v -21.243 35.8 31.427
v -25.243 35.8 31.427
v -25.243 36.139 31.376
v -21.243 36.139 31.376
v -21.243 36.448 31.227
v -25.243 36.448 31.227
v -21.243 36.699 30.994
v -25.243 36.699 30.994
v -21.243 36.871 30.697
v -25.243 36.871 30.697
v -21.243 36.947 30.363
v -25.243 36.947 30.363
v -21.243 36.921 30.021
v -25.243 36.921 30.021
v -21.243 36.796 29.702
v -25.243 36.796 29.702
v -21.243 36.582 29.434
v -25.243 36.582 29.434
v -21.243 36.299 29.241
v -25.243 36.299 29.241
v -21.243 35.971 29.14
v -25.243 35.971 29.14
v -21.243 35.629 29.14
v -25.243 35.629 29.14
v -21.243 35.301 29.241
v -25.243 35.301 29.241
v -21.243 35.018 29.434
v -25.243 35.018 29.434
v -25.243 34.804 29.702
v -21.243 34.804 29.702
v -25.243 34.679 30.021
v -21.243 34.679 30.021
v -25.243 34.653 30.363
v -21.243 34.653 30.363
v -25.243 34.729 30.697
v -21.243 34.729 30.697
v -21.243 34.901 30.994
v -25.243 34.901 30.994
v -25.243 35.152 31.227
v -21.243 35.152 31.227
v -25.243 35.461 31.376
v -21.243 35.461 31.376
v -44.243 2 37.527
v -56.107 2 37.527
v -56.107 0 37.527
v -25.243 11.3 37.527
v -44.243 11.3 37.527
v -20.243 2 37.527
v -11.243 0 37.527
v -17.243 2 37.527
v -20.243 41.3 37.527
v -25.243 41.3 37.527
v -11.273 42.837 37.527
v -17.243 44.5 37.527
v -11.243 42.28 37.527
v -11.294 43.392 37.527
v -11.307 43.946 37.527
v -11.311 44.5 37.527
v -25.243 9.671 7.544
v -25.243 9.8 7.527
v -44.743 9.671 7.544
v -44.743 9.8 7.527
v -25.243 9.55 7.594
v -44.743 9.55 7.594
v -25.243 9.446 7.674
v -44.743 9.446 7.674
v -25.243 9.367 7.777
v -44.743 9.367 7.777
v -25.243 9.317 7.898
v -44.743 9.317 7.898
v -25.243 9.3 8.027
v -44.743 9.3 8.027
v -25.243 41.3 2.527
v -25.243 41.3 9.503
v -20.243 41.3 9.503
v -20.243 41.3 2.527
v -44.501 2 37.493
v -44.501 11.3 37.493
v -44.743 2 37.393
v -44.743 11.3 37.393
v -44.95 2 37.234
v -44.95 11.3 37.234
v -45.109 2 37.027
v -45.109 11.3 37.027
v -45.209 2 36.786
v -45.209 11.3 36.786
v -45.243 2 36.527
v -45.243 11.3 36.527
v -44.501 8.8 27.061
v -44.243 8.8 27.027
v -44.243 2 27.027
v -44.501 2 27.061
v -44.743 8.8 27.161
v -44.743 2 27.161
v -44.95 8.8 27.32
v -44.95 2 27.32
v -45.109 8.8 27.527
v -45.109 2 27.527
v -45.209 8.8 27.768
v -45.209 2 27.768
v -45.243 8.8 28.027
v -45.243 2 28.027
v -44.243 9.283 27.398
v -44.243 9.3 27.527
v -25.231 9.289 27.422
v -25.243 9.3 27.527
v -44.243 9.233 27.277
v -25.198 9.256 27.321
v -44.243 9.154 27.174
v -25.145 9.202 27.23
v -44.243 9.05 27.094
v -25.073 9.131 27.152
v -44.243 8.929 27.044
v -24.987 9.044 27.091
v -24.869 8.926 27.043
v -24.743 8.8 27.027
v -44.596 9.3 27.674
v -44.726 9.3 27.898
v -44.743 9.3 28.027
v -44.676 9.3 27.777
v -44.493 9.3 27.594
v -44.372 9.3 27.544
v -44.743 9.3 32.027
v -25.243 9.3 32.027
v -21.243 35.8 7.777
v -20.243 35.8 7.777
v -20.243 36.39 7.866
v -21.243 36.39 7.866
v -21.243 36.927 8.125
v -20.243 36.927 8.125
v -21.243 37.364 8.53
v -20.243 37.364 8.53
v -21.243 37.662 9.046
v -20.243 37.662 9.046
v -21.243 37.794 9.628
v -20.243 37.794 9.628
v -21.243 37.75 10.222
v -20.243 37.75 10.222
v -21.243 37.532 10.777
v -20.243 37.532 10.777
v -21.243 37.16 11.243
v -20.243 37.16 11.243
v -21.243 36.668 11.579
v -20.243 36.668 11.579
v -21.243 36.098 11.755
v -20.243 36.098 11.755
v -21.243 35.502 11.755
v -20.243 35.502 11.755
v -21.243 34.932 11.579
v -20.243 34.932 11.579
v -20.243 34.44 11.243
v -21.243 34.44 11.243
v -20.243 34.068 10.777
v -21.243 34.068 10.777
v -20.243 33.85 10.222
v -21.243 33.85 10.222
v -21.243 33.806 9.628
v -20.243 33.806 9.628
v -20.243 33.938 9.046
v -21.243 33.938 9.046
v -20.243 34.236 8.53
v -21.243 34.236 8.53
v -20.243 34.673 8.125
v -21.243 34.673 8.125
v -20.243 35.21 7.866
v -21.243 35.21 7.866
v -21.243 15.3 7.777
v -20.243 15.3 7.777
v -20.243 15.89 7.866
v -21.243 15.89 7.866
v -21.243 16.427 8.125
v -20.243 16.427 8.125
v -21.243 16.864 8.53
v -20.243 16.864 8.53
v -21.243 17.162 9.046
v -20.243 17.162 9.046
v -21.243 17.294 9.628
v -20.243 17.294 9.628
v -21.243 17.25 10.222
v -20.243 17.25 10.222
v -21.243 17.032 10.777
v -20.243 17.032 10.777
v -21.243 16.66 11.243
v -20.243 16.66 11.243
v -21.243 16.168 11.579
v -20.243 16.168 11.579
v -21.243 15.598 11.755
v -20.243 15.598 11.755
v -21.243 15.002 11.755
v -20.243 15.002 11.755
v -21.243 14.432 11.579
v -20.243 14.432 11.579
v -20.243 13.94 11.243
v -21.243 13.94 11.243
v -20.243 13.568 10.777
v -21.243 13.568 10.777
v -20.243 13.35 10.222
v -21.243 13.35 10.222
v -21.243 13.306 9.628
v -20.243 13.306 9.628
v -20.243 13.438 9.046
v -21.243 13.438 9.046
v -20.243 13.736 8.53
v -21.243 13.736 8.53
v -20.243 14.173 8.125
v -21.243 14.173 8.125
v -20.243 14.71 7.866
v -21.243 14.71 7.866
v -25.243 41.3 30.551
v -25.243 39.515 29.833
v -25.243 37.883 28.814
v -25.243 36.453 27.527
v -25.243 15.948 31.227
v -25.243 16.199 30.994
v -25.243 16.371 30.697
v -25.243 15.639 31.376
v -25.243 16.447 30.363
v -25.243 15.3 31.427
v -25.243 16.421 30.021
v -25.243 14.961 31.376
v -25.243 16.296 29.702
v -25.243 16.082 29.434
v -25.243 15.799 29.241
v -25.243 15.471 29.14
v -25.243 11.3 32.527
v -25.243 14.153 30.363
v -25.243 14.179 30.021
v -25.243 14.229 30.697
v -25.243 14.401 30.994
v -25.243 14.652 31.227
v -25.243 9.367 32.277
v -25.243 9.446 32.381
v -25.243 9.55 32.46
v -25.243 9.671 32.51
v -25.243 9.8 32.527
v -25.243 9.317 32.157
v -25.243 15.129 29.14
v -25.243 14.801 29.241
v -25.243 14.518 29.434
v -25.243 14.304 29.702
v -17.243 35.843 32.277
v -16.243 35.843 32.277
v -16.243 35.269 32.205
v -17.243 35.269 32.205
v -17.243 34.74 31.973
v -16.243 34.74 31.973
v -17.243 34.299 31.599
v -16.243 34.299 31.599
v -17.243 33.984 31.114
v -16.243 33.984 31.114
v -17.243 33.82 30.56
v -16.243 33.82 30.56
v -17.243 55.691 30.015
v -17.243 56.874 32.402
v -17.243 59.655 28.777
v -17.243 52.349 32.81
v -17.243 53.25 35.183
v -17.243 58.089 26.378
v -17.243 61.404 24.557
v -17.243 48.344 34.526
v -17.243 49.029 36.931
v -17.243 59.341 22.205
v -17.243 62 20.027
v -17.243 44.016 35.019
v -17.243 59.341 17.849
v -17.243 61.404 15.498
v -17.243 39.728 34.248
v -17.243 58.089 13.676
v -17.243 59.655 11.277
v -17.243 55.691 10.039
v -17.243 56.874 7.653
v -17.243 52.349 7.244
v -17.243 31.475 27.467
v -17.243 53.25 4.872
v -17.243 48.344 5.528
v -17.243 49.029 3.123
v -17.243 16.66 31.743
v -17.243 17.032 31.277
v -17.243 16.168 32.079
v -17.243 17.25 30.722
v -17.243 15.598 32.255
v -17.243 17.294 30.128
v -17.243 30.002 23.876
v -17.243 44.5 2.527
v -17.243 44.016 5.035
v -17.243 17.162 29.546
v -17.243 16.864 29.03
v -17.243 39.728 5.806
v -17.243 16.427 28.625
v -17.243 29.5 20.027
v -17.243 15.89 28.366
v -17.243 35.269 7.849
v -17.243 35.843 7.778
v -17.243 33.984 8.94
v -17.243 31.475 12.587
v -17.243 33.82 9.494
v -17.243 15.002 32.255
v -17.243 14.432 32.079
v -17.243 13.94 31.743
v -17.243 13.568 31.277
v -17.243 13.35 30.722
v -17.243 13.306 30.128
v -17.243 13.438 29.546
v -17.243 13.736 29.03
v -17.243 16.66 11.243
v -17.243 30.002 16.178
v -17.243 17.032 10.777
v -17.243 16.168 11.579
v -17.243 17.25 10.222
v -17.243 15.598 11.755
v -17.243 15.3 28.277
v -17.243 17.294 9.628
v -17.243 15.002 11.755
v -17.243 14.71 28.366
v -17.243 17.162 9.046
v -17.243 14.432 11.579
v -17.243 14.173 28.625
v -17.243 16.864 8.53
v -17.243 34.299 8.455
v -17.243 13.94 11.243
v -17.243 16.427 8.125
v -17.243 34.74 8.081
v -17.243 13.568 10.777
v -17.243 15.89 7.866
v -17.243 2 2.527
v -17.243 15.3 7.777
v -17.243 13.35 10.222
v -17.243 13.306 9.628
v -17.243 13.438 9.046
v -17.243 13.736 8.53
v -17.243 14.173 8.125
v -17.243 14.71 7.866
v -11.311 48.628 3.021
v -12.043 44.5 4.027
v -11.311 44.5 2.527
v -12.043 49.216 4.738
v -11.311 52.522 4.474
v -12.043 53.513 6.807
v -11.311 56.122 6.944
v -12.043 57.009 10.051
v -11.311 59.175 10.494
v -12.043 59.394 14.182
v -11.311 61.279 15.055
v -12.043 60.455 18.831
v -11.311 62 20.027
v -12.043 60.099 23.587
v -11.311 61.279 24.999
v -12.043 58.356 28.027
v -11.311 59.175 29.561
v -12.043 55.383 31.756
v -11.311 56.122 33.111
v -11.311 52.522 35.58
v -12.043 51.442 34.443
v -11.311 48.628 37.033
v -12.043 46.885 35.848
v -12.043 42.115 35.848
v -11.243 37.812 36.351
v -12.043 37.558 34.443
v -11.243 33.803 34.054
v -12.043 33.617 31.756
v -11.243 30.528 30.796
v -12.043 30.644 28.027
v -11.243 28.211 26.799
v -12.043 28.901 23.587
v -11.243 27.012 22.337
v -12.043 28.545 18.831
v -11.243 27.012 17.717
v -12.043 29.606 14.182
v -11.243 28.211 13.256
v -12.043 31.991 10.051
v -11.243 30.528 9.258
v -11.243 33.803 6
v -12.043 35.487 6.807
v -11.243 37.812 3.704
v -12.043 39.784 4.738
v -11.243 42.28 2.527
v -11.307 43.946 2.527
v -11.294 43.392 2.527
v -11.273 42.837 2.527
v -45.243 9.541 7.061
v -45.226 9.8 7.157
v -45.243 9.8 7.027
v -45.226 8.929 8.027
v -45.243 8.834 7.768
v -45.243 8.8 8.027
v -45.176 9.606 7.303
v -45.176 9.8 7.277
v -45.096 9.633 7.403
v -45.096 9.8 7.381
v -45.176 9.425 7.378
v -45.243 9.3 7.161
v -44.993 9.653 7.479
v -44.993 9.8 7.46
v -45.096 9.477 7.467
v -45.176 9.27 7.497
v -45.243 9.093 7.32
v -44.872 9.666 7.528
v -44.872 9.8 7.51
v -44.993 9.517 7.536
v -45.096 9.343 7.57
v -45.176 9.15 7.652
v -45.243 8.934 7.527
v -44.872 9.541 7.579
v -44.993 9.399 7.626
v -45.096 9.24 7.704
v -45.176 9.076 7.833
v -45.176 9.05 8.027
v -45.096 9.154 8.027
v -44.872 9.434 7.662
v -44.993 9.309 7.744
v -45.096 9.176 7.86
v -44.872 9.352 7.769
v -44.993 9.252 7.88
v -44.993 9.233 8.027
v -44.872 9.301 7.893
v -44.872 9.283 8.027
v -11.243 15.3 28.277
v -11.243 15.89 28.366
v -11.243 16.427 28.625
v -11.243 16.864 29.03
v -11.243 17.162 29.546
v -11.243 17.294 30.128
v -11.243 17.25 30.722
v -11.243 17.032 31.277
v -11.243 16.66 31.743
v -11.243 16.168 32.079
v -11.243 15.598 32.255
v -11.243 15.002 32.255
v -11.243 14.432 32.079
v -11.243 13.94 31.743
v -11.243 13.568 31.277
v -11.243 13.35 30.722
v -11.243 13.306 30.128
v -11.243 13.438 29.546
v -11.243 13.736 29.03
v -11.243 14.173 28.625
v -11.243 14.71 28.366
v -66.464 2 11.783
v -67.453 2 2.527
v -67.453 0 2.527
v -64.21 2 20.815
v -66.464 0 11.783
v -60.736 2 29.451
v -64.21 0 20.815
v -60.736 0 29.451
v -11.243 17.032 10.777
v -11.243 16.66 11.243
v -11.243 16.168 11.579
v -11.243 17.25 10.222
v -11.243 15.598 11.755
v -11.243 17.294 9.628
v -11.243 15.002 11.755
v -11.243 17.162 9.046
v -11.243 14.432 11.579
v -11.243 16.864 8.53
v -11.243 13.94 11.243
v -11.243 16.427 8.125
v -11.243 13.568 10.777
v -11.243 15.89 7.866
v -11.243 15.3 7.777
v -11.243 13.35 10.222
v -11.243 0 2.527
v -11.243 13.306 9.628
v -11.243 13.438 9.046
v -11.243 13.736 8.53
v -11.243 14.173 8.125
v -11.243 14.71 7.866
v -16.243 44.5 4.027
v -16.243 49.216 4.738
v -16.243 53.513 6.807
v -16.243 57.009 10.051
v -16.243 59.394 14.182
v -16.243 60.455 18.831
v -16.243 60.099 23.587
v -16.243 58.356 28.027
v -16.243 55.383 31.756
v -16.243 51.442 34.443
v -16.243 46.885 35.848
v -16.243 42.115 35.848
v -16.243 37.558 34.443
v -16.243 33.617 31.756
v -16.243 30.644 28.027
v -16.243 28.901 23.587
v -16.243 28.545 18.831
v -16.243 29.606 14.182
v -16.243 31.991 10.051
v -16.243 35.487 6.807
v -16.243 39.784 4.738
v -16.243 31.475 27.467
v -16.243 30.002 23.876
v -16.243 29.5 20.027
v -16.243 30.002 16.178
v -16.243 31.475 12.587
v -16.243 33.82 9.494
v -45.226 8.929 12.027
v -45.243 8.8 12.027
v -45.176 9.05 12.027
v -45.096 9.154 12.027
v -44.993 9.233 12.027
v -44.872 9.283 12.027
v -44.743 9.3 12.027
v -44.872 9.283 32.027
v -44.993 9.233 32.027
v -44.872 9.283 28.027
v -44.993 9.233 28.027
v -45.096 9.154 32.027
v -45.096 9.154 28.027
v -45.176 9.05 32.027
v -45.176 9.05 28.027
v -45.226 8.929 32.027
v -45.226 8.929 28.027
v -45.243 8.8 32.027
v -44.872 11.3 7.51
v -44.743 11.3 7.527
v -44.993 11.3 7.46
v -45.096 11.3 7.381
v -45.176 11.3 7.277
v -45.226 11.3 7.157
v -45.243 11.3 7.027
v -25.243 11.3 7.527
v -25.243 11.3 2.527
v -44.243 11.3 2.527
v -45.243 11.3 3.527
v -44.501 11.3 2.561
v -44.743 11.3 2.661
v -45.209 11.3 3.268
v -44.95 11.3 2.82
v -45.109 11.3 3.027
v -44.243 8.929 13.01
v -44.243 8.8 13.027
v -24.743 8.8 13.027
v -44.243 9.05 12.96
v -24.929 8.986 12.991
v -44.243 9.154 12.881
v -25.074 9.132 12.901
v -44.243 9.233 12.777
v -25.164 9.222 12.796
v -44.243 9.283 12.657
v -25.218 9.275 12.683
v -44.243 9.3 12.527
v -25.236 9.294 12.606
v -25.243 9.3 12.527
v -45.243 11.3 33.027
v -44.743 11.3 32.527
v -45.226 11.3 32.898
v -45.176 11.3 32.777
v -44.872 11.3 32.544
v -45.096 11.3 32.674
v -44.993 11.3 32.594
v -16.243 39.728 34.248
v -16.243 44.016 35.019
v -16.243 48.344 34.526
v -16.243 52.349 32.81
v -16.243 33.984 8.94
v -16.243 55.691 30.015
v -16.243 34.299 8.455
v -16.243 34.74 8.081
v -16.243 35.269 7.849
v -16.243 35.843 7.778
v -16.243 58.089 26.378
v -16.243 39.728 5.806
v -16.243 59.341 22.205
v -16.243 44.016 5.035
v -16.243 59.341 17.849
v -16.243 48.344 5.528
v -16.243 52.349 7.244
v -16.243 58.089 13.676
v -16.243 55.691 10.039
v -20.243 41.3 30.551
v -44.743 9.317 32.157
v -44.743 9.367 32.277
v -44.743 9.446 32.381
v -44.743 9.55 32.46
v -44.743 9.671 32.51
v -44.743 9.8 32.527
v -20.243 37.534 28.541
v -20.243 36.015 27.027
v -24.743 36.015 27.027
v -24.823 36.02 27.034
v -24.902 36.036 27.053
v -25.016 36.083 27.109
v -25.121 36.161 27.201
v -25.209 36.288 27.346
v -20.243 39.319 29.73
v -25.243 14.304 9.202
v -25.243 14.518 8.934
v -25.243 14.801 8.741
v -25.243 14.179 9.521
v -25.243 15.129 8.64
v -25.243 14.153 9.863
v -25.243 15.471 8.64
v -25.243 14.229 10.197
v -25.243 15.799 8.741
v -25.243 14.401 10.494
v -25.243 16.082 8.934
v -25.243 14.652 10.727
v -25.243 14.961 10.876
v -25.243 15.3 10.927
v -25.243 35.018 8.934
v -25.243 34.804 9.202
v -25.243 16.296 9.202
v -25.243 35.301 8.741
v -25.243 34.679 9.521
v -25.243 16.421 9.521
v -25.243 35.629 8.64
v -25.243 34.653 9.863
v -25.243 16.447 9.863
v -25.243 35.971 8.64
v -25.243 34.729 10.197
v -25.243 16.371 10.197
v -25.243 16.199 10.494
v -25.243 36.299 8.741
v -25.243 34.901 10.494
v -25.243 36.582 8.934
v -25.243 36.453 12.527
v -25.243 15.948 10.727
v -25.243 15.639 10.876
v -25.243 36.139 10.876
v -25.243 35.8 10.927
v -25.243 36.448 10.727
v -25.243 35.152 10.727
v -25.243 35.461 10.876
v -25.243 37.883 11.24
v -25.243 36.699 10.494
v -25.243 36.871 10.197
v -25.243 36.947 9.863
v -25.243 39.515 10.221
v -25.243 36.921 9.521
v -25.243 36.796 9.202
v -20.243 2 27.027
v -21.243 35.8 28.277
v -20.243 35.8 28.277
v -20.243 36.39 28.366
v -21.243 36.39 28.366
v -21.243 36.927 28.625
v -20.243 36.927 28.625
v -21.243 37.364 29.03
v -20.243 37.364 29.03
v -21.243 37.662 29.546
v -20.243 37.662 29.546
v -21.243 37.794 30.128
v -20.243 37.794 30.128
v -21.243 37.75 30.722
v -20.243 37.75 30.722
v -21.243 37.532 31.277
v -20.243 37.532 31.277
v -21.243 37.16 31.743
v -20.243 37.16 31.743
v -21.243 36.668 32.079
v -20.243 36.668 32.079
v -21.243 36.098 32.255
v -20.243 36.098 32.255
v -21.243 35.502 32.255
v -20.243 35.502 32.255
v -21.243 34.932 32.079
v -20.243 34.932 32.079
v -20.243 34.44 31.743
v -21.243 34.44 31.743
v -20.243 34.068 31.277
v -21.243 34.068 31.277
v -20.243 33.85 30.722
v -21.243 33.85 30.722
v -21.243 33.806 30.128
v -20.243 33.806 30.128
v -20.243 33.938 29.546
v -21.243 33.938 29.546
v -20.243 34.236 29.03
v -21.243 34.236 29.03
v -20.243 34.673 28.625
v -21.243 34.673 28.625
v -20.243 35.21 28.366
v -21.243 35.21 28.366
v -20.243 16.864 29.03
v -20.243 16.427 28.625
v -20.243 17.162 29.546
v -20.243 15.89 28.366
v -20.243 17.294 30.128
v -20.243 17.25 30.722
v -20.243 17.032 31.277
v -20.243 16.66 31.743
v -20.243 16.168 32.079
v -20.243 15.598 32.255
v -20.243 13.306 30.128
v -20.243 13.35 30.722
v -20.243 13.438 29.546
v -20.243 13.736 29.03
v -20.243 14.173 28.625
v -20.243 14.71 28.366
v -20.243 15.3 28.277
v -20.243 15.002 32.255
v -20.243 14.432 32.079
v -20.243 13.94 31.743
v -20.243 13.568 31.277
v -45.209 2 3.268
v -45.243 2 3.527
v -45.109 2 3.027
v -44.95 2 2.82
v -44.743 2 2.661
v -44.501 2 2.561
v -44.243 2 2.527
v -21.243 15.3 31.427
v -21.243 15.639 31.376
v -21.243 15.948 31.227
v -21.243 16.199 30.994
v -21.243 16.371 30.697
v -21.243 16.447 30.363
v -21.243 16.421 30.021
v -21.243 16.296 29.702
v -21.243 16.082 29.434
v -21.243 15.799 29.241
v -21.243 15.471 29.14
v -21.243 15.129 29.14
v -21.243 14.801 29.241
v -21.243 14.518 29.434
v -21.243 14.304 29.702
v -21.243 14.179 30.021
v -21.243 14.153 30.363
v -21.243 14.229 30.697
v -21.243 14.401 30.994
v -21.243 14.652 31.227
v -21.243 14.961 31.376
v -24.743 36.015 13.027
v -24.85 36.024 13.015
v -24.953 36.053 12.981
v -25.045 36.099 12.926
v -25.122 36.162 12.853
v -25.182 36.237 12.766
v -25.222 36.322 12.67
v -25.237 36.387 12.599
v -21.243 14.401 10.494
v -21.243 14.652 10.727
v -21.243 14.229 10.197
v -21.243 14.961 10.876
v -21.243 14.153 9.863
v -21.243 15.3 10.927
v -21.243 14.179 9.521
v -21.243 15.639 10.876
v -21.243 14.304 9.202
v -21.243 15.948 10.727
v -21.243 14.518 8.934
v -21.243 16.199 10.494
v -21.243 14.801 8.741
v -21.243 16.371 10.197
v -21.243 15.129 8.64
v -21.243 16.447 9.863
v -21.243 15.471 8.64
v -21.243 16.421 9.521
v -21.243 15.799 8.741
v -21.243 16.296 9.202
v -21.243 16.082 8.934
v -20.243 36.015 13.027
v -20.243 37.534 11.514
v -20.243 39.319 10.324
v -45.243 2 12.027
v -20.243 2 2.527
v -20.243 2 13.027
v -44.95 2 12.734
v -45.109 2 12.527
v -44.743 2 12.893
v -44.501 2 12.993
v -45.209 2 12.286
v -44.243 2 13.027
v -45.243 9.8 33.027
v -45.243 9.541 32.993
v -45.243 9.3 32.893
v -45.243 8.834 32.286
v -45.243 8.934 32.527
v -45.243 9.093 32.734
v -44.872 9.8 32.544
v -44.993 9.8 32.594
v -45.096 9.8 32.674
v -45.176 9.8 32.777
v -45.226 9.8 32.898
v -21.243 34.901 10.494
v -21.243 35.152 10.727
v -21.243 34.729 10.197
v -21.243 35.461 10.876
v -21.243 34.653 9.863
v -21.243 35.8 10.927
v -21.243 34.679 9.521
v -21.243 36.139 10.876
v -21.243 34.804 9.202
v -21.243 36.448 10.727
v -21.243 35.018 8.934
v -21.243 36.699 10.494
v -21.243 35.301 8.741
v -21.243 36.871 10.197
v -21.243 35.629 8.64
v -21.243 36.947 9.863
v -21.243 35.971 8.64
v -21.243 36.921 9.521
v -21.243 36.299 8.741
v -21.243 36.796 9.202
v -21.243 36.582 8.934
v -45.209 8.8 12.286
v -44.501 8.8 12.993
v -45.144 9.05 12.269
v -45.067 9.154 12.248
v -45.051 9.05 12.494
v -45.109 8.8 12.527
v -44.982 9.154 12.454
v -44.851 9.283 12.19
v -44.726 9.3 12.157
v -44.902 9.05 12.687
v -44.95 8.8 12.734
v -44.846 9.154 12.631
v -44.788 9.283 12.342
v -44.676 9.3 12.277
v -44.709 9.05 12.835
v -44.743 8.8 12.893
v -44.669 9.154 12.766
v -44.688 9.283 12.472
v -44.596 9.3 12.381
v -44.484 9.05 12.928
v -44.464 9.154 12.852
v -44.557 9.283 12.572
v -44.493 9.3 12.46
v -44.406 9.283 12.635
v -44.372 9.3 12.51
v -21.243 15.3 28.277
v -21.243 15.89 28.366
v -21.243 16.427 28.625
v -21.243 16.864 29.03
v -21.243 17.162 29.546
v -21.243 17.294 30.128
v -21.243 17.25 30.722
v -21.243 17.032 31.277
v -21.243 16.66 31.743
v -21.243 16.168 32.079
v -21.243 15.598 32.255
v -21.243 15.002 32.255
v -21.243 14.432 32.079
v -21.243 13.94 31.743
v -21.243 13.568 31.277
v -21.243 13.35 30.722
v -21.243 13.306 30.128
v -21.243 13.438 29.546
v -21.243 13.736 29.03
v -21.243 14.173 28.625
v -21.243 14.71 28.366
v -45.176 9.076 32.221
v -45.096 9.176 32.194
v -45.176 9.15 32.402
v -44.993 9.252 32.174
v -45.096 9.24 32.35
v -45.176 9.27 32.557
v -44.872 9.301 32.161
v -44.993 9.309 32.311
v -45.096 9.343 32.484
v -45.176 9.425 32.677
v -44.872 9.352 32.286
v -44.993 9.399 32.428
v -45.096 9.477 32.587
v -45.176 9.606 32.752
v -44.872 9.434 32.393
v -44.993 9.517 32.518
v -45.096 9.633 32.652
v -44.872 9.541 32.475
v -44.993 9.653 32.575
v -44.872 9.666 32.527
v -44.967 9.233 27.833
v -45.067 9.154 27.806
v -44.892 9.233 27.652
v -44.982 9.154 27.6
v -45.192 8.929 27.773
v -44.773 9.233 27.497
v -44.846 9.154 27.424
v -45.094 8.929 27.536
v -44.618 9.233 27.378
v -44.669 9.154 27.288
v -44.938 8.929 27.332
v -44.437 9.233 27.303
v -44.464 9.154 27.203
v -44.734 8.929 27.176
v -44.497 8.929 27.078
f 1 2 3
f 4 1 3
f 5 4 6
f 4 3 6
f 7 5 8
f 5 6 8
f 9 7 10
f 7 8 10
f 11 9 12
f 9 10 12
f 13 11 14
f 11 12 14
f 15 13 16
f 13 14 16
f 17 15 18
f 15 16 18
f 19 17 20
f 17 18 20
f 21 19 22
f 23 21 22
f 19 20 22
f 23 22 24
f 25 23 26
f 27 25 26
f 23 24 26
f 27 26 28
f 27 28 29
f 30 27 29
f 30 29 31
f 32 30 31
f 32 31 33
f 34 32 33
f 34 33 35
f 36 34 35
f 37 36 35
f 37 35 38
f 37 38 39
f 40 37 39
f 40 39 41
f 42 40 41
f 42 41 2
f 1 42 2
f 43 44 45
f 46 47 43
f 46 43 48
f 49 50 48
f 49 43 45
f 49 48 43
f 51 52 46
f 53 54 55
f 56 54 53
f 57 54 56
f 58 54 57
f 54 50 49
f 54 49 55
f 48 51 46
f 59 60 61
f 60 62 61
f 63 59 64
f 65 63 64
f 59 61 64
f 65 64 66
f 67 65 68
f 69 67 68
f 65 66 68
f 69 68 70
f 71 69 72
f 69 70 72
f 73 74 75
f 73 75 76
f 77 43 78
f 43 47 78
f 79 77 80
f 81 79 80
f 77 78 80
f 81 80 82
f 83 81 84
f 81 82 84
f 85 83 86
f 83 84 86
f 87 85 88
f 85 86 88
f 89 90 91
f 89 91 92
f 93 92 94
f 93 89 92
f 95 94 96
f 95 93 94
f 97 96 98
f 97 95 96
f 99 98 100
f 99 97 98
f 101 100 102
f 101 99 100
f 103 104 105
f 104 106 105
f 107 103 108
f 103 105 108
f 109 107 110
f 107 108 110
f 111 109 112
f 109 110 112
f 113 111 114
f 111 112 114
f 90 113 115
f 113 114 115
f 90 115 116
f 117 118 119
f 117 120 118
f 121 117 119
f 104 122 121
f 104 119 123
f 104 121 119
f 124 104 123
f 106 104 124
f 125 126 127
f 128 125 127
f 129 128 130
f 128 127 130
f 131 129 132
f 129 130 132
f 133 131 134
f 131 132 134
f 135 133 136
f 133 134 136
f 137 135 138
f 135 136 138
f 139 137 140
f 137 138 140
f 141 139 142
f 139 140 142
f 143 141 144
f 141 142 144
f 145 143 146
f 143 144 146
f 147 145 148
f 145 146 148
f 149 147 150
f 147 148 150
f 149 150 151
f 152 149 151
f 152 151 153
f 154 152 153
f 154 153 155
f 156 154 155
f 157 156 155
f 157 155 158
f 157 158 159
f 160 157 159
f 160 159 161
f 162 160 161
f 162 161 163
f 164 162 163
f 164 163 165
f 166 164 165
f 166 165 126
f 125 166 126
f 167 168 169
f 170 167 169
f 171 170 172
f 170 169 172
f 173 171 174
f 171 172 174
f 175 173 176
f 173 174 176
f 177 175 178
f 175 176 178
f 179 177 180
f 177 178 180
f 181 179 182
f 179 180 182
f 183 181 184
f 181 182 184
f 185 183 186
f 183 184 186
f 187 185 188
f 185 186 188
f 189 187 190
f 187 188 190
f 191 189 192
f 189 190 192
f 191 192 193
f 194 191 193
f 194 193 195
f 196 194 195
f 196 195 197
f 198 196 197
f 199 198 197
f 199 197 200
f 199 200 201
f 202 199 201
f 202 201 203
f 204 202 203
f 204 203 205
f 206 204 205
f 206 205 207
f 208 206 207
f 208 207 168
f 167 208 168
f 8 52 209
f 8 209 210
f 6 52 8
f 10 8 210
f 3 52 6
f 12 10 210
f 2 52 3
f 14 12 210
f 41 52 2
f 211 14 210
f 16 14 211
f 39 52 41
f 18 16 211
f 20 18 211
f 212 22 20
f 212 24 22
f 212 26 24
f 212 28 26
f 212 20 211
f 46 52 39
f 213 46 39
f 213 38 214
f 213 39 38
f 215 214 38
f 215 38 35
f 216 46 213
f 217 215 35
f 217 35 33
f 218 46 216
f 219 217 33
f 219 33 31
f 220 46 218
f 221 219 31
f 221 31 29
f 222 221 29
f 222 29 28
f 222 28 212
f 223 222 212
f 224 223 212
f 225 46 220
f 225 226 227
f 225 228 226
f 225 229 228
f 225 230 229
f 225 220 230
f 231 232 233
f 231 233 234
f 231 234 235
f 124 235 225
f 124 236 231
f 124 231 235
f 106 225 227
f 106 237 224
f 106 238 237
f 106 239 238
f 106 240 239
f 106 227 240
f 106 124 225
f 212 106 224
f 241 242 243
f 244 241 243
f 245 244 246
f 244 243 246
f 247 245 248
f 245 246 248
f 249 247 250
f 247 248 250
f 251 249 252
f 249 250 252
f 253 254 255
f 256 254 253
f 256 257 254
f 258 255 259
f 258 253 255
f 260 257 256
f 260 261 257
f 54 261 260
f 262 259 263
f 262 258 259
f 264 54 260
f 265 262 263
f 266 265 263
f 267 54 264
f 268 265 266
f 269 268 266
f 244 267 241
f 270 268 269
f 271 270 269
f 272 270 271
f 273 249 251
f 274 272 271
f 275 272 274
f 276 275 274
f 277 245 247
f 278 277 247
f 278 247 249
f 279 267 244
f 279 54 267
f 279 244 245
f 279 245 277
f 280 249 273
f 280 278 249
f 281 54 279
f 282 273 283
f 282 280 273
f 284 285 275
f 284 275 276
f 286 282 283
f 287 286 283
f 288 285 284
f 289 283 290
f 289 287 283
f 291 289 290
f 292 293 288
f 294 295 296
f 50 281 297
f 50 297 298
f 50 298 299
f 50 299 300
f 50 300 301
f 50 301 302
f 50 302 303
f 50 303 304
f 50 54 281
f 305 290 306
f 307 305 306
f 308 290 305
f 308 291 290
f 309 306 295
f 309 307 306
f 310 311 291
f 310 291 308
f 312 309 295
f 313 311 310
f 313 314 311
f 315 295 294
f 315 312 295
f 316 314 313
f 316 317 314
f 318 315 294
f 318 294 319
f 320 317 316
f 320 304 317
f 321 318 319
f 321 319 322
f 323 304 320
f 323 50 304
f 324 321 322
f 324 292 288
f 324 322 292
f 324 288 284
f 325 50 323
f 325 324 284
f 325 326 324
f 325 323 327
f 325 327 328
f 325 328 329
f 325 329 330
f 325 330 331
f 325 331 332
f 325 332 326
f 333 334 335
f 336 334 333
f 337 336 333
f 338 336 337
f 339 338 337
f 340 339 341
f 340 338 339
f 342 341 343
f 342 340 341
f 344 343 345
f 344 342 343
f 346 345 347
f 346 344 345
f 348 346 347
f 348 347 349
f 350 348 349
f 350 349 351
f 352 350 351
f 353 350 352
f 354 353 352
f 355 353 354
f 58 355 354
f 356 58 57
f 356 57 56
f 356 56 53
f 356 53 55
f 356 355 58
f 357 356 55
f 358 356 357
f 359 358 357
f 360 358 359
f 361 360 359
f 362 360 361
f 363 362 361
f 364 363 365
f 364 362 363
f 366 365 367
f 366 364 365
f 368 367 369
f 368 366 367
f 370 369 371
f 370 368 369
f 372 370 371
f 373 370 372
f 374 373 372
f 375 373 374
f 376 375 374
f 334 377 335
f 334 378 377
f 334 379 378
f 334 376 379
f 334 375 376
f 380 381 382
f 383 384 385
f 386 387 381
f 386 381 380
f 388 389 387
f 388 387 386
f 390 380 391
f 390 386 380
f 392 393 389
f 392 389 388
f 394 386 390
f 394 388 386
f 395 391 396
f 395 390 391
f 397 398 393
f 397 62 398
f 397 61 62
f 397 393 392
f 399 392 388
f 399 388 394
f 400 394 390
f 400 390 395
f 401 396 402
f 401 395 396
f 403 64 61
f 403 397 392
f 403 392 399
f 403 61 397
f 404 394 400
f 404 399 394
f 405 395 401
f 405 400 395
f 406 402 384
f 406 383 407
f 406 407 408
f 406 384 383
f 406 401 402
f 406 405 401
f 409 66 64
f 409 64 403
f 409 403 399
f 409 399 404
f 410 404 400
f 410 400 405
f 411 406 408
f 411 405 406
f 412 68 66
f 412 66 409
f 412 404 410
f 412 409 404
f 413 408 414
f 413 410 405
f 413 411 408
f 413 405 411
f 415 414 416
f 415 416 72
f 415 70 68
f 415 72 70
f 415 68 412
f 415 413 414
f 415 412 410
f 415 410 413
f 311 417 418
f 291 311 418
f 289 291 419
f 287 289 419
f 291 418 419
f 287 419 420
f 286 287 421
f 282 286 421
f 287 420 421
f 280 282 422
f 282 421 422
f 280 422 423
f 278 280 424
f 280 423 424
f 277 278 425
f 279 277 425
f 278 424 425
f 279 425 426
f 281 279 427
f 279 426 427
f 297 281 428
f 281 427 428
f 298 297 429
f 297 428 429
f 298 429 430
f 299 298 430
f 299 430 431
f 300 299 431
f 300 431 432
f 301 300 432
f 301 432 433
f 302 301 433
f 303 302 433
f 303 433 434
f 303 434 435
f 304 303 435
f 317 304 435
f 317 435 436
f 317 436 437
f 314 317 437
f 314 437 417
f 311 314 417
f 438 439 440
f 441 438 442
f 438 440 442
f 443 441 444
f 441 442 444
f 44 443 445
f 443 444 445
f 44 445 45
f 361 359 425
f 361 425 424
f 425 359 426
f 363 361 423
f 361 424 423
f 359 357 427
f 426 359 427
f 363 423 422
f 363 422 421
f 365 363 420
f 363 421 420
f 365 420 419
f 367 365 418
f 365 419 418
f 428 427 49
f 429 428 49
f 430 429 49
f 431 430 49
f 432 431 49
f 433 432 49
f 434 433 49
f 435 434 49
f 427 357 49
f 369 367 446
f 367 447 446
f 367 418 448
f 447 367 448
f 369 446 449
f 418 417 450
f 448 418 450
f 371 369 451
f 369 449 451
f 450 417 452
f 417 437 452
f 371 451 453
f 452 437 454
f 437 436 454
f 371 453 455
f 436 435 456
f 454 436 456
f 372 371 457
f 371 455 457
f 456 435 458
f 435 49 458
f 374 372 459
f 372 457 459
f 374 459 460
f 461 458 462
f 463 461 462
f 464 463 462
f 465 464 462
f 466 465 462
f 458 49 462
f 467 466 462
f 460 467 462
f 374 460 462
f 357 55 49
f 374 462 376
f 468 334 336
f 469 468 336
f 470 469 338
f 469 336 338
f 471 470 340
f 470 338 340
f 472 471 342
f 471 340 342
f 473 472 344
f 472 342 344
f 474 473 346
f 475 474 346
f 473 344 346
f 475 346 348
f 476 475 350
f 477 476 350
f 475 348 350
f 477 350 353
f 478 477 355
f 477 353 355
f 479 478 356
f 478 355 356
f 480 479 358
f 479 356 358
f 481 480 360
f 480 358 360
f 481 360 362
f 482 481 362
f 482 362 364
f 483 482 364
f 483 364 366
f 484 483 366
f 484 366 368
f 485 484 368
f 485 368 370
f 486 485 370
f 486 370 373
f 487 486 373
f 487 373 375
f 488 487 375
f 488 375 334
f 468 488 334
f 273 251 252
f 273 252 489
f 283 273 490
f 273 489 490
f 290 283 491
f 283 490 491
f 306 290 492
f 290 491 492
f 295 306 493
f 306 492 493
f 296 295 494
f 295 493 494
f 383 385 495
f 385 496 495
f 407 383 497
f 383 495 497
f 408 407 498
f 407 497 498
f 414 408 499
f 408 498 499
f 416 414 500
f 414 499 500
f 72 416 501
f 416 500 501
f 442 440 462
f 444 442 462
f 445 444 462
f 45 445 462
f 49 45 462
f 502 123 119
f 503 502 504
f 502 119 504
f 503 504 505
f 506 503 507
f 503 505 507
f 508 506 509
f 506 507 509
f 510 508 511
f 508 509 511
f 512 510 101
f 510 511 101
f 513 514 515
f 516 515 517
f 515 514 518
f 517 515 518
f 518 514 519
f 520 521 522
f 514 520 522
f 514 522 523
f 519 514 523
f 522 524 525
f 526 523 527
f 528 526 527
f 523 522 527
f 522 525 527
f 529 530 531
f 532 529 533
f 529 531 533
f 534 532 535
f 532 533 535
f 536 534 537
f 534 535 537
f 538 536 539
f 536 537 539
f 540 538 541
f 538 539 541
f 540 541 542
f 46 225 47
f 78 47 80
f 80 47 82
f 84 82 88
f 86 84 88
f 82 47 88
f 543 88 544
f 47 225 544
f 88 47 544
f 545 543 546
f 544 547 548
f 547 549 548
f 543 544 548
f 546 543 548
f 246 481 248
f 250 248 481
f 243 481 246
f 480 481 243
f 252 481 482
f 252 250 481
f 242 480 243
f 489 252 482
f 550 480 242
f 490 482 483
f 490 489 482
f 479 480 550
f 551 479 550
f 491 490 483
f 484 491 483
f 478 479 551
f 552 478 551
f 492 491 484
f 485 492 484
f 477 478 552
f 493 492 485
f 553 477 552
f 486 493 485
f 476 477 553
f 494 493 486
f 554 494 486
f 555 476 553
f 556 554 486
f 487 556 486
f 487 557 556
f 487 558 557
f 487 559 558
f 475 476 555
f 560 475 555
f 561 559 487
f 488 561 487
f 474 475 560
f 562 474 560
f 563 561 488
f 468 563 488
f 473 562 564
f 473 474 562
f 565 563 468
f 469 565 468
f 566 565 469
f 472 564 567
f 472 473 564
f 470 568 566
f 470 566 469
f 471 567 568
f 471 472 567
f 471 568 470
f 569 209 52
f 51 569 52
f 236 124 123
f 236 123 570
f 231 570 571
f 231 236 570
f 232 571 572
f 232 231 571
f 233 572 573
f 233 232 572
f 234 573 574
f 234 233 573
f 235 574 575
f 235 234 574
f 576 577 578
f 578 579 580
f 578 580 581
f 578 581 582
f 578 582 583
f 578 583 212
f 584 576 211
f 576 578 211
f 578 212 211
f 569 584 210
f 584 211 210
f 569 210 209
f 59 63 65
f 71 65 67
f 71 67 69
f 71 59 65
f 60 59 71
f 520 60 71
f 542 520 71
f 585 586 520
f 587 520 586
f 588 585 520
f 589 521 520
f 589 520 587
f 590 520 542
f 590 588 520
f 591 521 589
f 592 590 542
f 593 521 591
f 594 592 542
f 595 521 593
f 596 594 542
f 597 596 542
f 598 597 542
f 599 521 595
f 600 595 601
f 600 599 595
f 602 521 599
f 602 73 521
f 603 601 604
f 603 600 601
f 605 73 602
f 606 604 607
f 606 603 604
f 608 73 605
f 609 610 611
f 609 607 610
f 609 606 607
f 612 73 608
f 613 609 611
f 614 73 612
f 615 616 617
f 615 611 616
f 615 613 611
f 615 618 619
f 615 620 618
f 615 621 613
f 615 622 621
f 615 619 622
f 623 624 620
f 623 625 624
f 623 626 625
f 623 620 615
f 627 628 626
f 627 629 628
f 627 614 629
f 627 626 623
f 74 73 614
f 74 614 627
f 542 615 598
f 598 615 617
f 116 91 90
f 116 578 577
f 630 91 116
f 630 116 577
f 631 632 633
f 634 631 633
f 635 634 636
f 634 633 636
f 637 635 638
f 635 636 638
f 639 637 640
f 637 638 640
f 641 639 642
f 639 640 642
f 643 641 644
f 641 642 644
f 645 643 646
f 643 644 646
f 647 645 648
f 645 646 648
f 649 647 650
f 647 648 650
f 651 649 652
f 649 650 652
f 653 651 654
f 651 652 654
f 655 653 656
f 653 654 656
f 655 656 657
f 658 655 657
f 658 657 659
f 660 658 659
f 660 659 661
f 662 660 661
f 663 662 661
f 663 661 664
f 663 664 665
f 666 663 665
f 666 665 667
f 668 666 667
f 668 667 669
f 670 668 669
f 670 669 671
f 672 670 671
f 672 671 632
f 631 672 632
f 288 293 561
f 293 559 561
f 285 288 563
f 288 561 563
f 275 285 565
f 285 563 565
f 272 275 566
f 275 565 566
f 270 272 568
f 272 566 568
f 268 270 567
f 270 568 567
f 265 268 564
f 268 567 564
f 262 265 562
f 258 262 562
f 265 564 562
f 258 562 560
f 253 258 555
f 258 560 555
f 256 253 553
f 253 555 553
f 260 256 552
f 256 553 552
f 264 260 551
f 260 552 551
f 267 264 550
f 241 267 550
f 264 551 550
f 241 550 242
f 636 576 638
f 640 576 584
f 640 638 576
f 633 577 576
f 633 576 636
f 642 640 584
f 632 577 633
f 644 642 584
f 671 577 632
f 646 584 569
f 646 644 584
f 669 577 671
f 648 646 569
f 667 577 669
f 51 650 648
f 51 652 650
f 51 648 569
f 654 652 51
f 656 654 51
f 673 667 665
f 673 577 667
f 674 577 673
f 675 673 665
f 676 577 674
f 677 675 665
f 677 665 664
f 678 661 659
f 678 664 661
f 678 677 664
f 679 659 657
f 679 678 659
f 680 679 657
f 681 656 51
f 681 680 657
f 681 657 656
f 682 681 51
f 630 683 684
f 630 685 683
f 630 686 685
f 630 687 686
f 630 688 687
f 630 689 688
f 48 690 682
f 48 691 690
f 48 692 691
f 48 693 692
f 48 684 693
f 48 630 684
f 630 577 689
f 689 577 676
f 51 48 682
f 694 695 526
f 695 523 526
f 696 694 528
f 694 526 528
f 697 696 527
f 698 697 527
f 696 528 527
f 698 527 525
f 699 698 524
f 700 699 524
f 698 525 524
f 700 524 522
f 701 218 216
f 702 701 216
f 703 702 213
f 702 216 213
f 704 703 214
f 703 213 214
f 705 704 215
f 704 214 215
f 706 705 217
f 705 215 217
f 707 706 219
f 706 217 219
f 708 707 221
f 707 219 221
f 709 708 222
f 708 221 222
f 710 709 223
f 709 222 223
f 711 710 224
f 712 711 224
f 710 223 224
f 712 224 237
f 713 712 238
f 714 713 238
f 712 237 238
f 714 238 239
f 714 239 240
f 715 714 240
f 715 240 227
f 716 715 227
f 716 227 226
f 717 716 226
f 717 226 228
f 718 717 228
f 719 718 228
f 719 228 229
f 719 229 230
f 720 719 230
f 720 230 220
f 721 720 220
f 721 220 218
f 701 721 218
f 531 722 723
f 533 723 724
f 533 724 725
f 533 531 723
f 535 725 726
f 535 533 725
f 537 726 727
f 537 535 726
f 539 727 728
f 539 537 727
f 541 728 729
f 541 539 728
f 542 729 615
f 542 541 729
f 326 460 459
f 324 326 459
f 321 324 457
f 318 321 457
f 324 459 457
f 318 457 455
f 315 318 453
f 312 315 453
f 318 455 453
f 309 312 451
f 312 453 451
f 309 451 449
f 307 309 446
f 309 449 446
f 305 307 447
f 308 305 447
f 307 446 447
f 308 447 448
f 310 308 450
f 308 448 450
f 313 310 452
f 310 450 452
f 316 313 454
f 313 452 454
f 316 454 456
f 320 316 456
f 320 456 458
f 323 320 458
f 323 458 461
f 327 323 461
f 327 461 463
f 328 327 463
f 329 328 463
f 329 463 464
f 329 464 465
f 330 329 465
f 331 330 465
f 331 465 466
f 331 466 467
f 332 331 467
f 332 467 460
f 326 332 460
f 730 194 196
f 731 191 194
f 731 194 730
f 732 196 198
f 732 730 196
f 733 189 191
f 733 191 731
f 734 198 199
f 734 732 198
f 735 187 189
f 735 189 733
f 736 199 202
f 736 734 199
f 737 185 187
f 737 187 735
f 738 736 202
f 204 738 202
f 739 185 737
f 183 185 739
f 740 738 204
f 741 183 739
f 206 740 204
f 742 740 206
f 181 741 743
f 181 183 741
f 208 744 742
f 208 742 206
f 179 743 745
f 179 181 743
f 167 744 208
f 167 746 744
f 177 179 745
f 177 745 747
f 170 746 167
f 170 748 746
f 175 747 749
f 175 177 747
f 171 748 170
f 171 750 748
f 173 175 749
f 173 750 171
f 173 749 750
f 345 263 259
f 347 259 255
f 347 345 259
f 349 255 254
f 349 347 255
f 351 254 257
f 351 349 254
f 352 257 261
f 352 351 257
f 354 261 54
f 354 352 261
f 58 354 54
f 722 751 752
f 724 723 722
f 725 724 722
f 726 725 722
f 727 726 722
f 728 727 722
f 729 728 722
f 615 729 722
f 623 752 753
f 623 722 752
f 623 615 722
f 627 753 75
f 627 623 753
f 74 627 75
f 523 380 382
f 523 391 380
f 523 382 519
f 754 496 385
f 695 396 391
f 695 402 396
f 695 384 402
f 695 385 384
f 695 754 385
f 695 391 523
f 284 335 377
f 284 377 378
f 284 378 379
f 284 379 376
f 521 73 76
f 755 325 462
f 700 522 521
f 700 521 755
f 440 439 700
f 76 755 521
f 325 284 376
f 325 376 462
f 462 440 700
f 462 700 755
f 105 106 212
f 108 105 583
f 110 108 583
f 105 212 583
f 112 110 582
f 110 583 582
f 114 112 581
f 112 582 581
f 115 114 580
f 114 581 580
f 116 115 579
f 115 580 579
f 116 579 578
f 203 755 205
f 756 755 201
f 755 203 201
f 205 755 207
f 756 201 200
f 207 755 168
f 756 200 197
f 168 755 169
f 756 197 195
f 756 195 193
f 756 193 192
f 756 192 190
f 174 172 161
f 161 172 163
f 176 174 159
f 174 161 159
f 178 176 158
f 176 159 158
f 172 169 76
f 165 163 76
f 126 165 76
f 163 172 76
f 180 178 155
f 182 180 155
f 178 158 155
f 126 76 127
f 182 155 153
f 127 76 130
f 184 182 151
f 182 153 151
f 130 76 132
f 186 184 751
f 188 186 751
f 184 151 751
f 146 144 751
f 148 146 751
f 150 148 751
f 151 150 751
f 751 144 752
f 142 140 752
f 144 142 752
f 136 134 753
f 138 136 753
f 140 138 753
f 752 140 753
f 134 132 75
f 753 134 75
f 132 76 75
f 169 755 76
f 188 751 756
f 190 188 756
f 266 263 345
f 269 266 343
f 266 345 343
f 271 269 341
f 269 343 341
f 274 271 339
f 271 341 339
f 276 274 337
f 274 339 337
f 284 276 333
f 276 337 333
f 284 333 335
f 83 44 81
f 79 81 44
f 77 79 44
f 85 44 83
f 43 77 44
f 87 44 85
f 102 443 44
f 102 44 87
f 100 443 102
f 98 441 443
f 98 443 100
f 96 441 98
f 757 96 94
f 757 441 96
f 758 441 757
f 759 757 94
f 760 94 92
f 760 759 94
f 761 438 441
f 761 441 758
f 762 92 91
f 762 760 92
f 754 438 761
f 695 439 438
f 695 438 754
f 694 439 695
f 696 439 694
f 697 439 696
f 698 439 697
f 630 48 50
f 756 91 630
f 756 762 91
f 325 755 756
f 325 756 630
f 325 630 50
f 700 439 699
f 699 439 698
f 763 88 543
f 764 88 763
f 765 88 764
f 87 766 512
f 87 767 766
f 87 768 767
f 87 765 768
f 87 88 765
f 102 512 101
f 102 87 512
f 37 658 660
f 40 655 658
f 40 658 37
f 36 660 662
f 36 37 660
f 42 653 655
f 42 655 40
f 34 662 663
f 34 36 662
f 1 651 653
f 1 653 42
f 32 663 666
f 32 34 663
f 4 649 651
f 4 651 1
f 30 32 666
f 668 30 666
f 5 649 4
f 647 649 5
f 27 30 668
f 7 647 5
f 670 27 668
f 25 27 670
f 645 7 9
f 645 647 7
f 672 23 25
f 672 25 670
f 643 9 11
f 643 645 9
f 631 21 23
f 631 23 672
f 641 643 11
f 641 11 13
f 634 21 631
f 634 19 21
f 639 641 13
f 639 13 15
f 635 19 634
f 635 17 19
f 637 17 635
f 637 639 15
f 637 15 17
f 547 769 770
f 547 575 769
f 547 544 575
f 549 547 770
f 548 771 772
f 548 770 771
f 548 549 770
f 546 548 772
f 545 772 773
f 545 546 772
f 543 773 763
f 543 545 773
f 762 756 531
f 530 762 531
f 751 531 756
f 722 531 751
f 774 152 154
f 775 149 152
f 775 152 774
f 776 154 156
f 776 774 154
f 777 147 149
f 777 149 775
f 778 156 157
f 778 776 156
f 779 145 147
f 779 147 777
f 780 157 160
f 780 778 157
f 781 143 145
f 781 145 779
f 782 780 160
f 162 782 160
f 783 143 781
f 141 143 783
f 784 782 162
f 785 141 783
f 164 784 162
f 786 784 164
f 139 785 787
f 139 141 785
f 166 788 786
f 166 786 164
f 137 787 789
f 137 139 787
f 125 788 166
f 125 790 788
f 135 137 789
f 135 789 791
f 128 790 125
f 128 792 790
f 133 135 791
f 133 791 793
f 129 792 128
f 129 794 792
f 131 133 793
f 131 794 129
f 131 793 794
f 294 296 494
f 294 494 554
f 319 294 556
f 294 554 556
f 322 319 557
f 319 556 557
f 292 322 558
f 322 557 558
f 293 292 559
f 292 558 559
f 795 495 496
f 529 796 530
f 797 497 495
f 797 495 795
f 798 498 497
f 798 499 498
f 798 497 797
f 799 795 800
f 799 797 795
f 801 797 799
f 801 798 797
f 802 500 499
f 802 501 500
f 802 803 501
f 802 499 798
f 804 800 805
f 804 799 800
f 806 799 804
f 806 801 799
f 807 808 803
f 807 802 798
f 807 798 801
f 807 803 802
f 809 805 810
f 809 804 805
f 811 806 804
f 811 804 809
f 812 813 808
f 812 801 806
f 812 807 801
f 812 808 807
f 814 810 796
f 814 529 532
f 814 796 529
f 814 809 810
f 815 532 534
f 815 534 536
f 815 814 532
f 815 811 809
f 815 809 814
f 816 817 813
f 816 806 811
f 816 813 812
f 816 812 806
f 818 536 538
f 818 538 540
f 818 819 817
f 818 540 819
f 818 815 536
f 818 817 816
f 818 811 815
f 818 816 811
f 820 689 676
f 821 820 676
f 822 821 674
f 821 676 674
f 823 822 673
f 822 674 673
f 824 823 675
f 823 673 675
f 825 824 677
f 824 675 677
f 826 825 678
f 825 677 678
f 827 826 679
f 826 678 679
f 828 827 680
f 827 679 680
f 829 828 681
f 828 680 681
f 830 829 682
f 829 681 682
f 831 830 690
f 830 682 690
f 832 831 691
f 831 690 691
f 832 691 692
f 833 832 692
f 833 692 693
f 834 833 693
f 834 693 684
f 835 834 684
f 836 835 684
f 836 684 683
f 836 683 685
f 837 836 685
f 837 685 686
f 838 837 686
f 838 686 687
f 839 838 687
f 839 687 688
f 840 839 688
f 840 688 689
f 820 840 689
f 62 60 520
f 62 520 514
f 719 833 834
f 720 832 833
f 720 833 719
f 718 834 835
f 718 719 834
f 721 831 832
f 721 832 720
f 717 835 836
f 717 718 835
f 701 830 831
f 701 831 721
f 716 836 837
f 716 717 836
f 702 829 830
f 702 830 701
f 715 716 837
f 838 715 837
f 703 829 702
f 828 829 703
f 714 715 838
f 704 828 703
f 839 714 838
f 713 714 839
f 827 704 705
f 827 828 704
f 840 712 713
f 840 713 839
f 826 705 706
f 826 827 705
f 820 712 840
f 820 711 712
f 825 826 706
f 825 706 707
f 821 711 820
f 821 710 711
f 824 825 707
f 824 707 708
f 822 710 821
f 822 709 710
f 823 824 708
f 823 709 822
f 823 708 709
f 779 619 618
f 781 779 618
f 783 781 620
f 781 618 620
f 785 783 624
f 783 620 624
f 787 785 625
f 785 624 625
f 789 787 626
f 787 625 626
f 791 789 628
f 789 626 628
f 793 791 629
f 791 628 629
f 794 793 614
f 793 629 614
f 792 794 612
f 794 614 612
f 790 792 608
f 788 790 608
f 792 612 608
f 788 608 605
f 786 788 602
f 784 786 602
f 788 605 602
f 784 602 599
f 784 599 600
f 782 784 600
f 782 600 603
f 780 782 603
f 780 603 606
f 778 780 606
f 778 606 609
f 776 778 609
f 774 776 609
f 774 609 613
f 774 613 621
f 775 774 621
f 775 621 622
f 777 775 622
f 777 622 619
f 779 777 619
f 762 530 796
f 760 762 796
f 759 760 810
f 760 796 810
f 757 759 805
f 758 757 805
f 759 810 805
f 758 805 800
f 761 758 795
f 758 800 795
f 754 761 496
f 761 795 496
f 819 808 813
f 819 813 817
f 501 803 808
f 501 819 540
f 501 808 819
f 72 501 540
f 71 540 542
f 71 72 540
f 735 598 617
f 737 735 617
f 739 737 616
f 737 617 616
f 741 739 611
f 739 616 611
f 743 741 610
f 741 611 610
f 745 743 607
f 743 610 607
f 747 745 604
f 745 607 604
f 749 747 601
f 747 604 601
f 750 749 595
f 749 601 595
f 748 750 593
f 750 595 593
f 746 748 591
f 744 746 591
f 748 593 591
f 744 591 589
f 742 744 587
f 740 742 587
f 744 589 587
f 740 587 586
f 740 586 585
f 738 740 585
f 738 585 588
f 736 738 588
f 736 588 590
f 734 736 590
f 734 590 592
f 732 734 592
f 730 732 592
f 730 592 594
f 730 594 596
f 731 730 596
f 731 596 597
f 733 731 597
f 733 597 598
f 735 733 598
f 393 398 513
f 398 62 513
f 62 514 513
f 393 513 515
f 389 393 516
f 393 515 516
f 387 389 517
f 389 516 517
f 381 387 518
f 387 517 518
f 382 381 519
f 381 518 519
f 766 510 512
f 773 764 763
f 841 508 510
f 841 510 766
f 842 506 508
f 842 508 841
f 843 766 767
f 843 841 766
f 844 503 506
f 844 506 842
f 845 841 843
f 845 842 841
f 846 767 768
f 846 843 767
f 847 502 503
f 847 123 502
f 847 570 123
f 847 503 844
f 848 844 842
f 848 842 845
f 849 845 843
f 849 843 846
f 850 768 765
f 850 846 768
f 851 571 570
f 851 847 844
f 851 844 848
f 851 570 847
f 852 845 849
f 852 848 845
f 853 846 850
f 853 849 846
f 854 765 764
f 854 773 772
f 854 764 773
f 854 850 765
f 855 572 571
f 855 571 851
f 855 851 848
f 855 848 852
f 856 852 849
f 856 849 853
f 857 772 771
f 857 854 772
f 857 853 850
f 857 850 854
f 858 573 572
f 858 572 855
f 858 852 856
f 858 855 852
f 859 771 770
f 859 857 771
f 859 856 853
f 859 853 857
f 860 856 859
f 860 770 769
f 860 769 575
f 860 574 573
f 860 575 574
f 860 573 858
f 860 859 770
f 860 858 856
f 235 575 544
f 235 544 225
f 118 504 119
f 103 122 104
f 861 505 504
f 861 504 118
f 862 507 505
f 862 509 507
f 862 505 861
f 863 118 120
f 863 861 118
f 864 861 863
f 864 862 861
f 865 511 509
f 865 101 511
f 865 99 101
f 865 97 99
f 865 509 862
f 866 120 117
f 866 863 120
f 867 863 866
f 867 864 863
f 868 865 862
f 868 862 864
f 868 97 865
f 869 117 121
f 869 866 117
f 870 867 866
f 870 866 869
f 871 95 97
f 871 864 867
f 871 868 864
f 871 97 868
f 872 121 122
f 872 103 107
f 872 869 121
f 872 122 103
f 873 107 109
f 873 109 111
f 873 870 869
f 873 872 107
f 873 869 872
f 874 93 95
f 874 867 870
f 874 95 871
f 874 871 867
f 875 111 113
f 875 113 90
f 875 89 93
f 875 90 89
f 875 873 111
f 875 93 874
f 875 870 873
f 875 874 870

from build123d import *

# Parameters (mm, degrees)
EXTRUDE_1_DEPTH     = 2
SKETCH_2_W          = 6
SKETCH_2_H          = 35
EXTRUDE_2_DEPTH     = 60
FILLET_1_R          = 17.5
SKETCH_3_R          = 16
CUT_EXTRUDE_1_DEPTH = 5
CHAMFER_1_SIZE      = 1.640243073
CHAMFER_1_SIZE_2    = 0.8
SKETCH_4_R          = 15
CUT_EXTRUDE_2_DEPTH = 105.385422037
SKETCH_5_W          = 25
SKETCH_5_H          = 10.5
EXTRUDE_3_DEPTH     = 7.3
EXTRUDE_4_DEPTH     = 2
FILLET_2_R          = 1
EXTRUDE_5_DEPTH     = 5
SKETCH_9_R          = 1.15
CUT_EXTRUDE_3_DEPTH = 101.277297201
SKETCH_10_R         = 2
CUT_EXTRUDE_4_DEPTH = 10
FILLET_3_R          = 0.5
SKETCH_12_W         = 56.21
SKETCH_12_H         = 29.03
CUT_EXTRUDE_5_DEPTH = 113.159332301


# Some blends are built 0.0001 mm under size
with BuildPart() as part:
    # 스케치1 → 보스-돌출1 (new body)
    with BuildSketch(Plane(origin=(0, 0, 0), x_dir=(1, 0, 0), z_dir=(0, 1, 0))):
        with BuildLine():
            Line((-11.24267666, -2.527135016), (-67.45267666, -2.527135016))
            ThreePointArc((-67.45267666, -2.527135016), (-50.72671765, -44.531450868), (-11.24267666, -66.557135016))
            Line((-11.24267666, -66.557135016), (-11.24267666, -2.527135016))
        make_face()
    extrude(amount=EXTRUDE_1_DEPTH)

    # 스케치2 → 보스-돌출2 (add)
    with BuildSketch(Plane(origin=(0, 2, 0), x_dir=(1, 0, 0), z_dir=(0, 1, 0))):
        with Locations((-14.24267666, -20.027135016)):
            Rectangle(SKETCH_2_W, SKETCH_2_H)
    extrude(amount=EXTRUDE_2_DEPTH)

    # 필렛1
    fillet_1_edges = [part.edges().sort_by_distance(p)[0] for p in [
        (-14.24267666, 62, 2.527135016),
        (-14.24267666, 62, 37.527135016),
    ]]
    fillet(fillet_1_edges, radius=FILLET_1_R - 0.0001)  # a hair under: the kernel refuses the full size

    # 스케치3 → 컷-돌출1 (cut)
    with BuildSketch(Plane(origin=(-11.24267666, 0, 0), x_dir=(0, 0, -1), z_dir=(1, 0, 0))):
        with Locations((-20.027135016, 44.5)):
            Circle(SKETCH_3_R)
    extrude(amount=-CUT_EXTRUDE_1_DEPTH, mode=Mode.SUBTRACT)

    # 모따기1
    # the kernel refuses this chamfer: 1.640243073, 0.8 mm, written as the material it takes off along each edge
    with BuildSketch(Plane(origin=(-11.24267666, 44.5, 20.027135016), x_dir=(0, 0, -1), z_dir=(0, -1, 0))) as chamfer_1_piece_1:
        Polygon((16 + CHAMFER_1_SIZE, 0), (16, -CHAMFER_1_SIZE_2), (16, 0), align=None)
    revolve(axis=Axis((-11.24267666, 44.5, 20.027135016), (1, 0, 0)), mode=Mode.SUBTRACT)

    # 스케치4 → 컷-돌출2 (cut, through all)
    with BuildSketch(Plane(origin=(-16.24267666, 0, 0), x_dir=(0, 0, -1), z_dir=(1, 0, 0))):
        with Locations((-20.027135016, 44.5)):
            Circle(SKETCH_4_R)
    extrude(amount=-CUT_EXTRUDE_2_DEPTH, mode=Mode.SUBTRACT)

    # 스케치5 → 보스-돌출3 (add)
    with BuildSketch(Plane(origin=(0, 2, 0), x_dir=(1, 0, 0), z_dir=(0, 1, 0))):
        with Locations((-32.74267666, -7.777135016)):
            Rectangle(SKETCH_5_W, SKETCH_5_H)
        with Locations((-32.74267666, -32.277135016)):
            Rectangle(SKETCH_5_W, SKETCH_5_H)
    extrude(amount=EXTRUDE_3_DEPTH)

    # 스케치6 → 보스-돌출4 (add)
    with BuildSketch(Plane(origin=(0, 9.3, 0), x_dir=(1, 0, 0), z_dir=(0, 1, 0))):
        Polygon((-45.24267666, -32.527135016), (-25.24267666, -32.527135016), (-25.24267666, -27.027135016), (-20.24267666, -27.027135016), (-20.24267666, -37.527135016), (-45.24267666, -37.527135016), align=None)
        Polygon((-45.24267666, -2.527135016), (-20.24267666, -2.527135016), (-20.24267666, -13.027135016), (-25.24267666, -13.027135016), (-25.24267666, -7.527135016), (-45.24267666, -7.527135016), align=None)
    extrude(amount=EXTRUDE_4_DEPTH)

    # 필렛2
    fillet_2_edges = [part.edges().sort_by_distance(p)[0] for p in [
        (-45.24267666, 6.65, 2.527135016),
        (-45.24267666, 5.65, 13.027135016),
        (-45.24267666, 5.65, 27.027135016),
        (-45.24267666, 6.65, 37.527135016),
    ]]
    fillet(fillet_2_edges, radius=FILLET_2_R)

    # 스케치7 → 보스-돌출5 (add)
    with BuildSketch(Plane.ZY.offset(25.24267666)):
        with BuildLine():
            Line((2.527135016, 11.3), (13.027135016, 11.3))
            Line((13.027135016, 11.3), (13.027135016, 36.014718626))
            ThreePointArc((13.027135016, 36.014718626), (10.875170651, 38.397414624), (9.502877322, 41.3))
            Line((9.502877322, 41.3), (2.527135016, 41.3))
            Line((2.527135016, 41.3), (2.527135016, 11.3))
        make_face()
        with BuildLine():
            Line((37.527135016, 11.3), (27.027135016, 11.3))
            Line((27.027135016, 11.3), (27.027135016, 36.014718626))
            ThreePointArc((27.027135016, 36.014718626), (29.17909938, 38.397414624), (30.551392709, 41.3))
            Line((30.551392709, 41.3), (37.527135016, 41.3))
            Line((37.527135016, 41.3), (37.527135016, 11.3))
        make_face()
    extrude(amount=-EXTRUDE_5_DEPTH)

    # 스케치9 → 컷-돌출3 (cut, through all)
    with BuildSketch(Plane.ZY.offset(25.24267666)):
        with Locations((9.777135016, 35.8)):
            Circle(SKETCH_9_R)
        with Locations((9.777135016, 15.3)):
            Circle(SKETCH_9_R)
        with Locations((30.277135016, 15.3)):
            Circle(SKETCH_9_R)
        with Locations((30.277135016, 35.8)):
            Circle(SKETCH_9_R)
    extrude(amount=-CUT_EXTRUDE_3_DEPTH, mode=Mode.SUBTRACT)

    # 스케치10 → 컷-돌출4 (cut)
    with BuildSketch(Plane(origin=(-11.24267666, 0, 0), x_dir=(0, 0, -1), z_dir=(1, 0, 0))):
        with Locations((-30.277135016, 15.3)):
            Circle(SKETCH_10_R)
        with Locations((-9.777135016, 15.3)):
            Circle(SKETCH_10_R)
        with Locations((-9.777135016, 35.8)):
            Circle(SKETCH_10_R)
        with Locations((-30.277135016, 35.8)):
            Circle(SKETCH_10_R)
    extrude(amount=-CUT_EXTRUDE_4_DEPTH, mode=Mode.SUBTRACT)

    # 필렛3
    fillet_3_edges = [part.edges().sort_by_distance(p)[0] for p in [
        (-45.24267666, 10.3, 32.527135016),
        (-25.24267666, 22.657359313, 27.027135016),
        (-35.24267666, 9.3, 32.527135016),
        (-45.24267666, 9.3, 30.277135016),
        (-44.949783441, 9.3, 27.320028235),
        (-34.74267666, 9.3, 13.027135016),
        (-44.949783441, 9.3, 12.734241797),
        (-45.24267666, 9.3, 9.777135016),
        (-35.24267666, 9.3, 7.527135016),
        (-45.24267666, 10.3, 7.527135016),
        (-25.24267666, 22.657359313, 13.027135016),
        (-34.74267666, 9.3, 27.027135016),
    ]]
    fillet(fillet_3_edges, radius=FILLET_3_R)

    # 스케치12 → 컷-돌출5 (cut, through all)
    with BuildSketch(Plane(origin=(0, 2, 0), x_dir=(1, 0, 0), z_dir=(0, 1, 0))):
        with Locations((-39.34767666, -52.042135016)):
            Rectangle(SKETCH_12_W, SKETCH_12_H)
    extrude(amount=-CUT_EXTRUDE_5_DEPTH, mode=Mode.SUBTRACT)


solid = part.part
